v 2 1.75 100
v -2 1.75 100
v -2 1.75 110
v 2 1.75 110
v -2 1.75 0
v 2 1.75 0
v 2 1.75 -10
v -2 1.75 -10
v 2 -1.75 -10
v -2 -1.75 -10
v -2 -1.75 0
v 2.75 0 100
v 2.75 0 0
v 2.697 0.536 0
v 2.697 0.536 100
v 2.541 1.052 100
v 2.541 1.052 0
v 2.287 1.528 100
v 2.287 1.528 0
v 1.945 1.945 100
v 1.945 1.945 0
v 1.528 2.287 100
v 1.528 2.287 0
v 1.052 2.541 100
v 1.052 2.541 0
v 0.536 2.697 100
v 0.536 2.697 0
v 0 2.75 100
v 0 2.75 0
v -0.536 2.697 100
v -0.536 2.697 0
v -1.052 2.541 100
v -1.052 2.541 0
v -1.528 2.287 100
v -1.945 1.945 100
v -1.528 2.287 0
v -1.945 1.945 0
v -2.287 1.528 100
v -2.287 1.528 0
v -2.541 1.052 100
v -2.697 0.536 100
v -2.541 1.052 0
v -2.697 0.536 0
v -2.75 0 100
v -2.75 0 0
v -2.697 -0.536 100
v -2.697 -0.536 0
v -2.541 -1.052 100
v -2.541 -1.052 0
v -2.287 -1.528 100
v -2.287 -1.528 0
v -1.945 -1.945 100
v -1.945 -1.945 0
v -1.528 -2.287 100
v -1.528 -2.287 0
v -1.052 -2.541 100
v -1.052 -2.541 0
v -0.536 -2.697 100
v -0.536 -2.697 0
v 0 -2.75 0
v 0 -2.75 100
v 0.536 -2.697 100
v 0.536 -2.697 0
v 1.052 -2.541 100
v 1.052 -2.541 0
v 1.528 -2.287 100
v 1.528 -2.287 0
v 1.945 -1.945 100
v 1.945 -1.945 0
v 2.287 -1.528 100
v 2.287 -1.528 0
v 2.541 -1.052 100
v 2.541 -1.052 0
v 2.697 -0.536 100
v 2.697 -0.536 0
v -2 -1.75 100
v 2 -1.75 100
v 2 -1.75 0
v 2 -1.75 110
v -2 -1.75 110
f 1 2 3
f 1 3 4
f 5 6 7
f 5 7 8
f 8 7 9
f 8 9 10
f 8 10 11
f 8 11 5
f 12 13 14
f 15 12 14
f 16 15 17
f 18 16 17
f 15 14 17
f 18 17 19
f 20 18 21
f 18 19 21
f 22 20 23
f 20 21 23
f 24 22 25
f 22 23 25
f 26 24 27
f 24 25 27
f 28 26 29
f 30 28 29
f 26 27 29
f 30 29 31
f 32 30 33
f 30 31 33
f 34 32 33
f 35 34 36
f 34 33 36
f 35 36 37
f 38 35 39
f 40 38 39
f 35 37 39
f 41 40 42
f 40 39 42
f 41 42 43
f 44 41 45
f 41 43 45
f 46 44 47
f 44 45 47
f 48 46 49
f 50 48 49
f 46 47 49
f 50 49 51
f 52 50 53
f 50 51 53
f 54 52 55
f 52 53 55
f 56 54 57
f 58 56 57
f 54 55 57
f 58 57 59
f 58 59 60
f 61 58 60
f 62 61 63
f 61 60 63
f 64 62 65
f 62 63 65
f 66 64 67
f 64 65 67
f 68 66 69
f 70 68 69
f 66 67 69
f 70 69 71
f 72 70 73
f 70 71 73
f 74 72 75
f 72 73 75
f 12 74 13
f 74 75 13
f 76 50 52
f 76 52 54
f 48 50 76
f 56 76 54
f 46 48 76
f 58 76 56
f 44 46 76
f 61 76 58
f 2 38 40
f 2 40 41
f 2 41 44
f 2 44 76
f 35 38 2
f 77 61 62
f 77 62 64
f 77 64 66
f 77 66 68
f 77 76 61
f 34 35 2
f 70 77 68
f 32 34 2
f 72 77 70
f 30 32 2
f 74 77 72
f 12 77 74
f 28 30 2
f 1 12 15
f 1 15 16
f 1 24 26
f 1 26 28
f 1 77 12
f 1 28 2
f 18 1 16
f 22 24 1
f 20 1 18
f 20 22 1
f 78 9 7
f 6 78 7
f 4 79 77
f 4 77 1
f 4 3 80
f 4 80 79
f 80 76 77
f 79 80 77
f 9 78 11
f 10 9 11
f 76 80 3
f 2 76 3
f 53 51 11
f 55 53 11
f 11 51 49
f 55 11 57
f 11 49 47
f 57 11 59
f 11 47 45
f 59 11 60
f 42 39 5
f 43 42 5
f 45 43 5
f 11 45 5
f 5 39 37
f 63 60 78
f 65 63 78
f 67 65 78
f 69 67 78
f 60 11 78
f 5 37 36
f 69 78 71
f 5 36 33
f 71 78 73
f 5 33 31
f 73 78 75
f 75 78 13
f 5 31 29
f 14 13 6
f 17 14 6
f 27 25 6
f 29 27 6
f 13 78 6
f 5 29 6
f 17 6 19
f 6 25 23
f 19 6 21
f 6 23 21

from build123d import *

# Parameters (mm, degrees)
SKETCH1_R           = 2.75
BOSS_EXTRUDE1_DEPTH = 100
SKETCH3_W           = 4
SKETCH3_H           = 3.5
BOSS_EXTRUDE2_DEPTH = 10
SKETCH4_W           = 4
SKETCH4_H           = 3.5
BOSS_EXTRUDE3_DEPTH = 10


with BuildPart() as part:
    # Sketch1 → Boss-Extrude1 (new body)
    with BuildSketch(Plane.XY):
        Circle(SKETCH1_R)
    extrude(amount=BOSS_EXTRUDE1_DEPTH)

    # Sketch3 → Boss-Extrude2 (add)
    with BuildSketch(Plane.XY.offset(100)):
        Rectangle(SKETCH3_W, SKETCH3_H)
    extrude(amount=BOSS_EXTRUDE2_DEPTH)

    # Sketch4 → Boss-Extrude3 (add)
    with BuildSketch(Plane(origin=(0, 0, 0), x_dir=(-1, 0, 0), z_dir=(0, 0, -1))):
        Rectangle(SKETCH4_W, SKETCH4_H)
    extrude(amount=BOSS_EXTRUDE3_DEPTH)


solid = part.part
